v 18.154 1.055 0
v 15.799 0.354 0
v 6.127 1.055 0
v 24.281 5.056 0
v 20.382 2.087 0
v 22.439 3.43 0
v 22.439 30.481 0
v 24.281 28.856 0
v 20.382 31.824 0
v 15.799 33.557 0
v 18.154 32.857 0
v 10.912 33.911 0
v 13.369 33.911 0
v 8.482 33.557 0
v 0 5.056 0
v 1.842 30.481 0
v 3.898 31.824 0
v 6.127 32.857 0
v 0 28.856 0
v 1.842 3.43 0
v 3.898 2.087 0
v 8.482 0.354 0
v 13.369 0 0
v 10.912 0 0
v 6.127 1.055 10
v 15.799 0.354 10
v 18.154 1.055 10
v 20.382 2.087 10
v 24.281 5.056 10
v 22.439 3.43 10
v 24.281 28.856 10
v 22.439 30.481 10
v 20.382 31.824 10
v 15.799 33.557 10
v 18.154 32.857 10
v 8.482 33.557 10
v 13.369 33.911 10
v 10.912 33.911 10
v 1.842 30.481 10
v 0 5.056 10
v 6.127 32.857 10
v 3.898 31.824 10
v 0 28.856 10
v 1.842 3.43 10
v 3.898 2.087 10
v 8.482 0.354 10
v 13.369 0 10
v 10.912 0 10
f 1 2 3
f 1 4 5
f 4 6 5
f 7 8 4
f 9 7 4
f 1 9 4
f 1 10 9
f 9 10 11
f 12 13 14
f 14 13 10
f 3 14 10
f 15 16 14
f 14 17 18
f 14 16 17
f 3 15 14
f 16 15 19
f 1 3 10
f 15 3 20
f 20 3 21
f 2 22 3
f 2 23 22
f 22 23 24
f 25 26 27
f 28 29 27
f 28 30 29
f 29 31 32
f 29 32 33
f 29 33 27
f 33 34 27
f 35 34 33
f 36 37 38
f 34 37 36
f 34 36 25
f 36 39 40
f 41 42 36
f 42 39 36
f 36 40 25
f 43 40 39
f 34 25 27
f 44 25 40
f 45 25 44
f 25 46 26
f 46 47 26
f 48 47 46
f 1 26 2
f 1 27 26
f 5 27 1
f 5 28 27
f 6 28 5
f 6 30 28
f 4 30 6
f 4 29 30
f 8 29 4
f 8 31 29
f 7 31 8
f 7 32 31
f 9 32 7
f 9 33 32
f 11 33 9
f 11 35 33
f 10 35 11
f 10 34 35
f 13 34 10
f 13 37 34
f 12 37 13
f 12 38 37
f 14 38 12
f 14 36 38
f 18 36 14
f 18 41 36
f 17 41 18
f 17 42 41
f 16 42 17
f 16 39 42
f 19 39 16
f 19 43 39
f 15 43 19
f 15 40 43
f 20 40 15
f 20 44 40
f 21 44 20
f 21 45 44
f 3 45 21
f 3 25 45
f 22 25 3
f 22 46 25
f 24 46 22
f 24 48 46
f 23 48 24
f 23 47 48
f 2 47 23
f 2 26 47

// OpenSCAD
$fn = 32;

// ----------------------------------------------------------------------
// Eccentric disc: double_d, 10 mm thick
// ----------------------------------------------------------------------

// --- parameters (mm) ---
profile_height = 10;      // extrusion height
profile_points = 24;      // points of the closed outline

profile = [[24.281, 28.856], [22.439, 30.481], [20.382, 31.824], [18.154, 32.857], [15.799, 33.557], [13.369, 33.911], [10.912, 33.911], [8.482, 33.557], [6.127, 32.857], [3.898, 31.824], [1.842, 30.481], [0, 28.856], [0, 5.056], [1.842, 3.43], [3.898, 2.087], [6.127, 1.055], [8.482, 0.354], [10.912, 0], [13.369, 0], [15.799, 0.354], [18.154, 1.055], [20.382, 2.087], [22.439, 3.43], [24.281, 5.056]];  // single closed polygon, 24 points, counter clockwise

// --- the one profile operation ---
linear_extrude(height = profile_height) polygon(points = profile);
